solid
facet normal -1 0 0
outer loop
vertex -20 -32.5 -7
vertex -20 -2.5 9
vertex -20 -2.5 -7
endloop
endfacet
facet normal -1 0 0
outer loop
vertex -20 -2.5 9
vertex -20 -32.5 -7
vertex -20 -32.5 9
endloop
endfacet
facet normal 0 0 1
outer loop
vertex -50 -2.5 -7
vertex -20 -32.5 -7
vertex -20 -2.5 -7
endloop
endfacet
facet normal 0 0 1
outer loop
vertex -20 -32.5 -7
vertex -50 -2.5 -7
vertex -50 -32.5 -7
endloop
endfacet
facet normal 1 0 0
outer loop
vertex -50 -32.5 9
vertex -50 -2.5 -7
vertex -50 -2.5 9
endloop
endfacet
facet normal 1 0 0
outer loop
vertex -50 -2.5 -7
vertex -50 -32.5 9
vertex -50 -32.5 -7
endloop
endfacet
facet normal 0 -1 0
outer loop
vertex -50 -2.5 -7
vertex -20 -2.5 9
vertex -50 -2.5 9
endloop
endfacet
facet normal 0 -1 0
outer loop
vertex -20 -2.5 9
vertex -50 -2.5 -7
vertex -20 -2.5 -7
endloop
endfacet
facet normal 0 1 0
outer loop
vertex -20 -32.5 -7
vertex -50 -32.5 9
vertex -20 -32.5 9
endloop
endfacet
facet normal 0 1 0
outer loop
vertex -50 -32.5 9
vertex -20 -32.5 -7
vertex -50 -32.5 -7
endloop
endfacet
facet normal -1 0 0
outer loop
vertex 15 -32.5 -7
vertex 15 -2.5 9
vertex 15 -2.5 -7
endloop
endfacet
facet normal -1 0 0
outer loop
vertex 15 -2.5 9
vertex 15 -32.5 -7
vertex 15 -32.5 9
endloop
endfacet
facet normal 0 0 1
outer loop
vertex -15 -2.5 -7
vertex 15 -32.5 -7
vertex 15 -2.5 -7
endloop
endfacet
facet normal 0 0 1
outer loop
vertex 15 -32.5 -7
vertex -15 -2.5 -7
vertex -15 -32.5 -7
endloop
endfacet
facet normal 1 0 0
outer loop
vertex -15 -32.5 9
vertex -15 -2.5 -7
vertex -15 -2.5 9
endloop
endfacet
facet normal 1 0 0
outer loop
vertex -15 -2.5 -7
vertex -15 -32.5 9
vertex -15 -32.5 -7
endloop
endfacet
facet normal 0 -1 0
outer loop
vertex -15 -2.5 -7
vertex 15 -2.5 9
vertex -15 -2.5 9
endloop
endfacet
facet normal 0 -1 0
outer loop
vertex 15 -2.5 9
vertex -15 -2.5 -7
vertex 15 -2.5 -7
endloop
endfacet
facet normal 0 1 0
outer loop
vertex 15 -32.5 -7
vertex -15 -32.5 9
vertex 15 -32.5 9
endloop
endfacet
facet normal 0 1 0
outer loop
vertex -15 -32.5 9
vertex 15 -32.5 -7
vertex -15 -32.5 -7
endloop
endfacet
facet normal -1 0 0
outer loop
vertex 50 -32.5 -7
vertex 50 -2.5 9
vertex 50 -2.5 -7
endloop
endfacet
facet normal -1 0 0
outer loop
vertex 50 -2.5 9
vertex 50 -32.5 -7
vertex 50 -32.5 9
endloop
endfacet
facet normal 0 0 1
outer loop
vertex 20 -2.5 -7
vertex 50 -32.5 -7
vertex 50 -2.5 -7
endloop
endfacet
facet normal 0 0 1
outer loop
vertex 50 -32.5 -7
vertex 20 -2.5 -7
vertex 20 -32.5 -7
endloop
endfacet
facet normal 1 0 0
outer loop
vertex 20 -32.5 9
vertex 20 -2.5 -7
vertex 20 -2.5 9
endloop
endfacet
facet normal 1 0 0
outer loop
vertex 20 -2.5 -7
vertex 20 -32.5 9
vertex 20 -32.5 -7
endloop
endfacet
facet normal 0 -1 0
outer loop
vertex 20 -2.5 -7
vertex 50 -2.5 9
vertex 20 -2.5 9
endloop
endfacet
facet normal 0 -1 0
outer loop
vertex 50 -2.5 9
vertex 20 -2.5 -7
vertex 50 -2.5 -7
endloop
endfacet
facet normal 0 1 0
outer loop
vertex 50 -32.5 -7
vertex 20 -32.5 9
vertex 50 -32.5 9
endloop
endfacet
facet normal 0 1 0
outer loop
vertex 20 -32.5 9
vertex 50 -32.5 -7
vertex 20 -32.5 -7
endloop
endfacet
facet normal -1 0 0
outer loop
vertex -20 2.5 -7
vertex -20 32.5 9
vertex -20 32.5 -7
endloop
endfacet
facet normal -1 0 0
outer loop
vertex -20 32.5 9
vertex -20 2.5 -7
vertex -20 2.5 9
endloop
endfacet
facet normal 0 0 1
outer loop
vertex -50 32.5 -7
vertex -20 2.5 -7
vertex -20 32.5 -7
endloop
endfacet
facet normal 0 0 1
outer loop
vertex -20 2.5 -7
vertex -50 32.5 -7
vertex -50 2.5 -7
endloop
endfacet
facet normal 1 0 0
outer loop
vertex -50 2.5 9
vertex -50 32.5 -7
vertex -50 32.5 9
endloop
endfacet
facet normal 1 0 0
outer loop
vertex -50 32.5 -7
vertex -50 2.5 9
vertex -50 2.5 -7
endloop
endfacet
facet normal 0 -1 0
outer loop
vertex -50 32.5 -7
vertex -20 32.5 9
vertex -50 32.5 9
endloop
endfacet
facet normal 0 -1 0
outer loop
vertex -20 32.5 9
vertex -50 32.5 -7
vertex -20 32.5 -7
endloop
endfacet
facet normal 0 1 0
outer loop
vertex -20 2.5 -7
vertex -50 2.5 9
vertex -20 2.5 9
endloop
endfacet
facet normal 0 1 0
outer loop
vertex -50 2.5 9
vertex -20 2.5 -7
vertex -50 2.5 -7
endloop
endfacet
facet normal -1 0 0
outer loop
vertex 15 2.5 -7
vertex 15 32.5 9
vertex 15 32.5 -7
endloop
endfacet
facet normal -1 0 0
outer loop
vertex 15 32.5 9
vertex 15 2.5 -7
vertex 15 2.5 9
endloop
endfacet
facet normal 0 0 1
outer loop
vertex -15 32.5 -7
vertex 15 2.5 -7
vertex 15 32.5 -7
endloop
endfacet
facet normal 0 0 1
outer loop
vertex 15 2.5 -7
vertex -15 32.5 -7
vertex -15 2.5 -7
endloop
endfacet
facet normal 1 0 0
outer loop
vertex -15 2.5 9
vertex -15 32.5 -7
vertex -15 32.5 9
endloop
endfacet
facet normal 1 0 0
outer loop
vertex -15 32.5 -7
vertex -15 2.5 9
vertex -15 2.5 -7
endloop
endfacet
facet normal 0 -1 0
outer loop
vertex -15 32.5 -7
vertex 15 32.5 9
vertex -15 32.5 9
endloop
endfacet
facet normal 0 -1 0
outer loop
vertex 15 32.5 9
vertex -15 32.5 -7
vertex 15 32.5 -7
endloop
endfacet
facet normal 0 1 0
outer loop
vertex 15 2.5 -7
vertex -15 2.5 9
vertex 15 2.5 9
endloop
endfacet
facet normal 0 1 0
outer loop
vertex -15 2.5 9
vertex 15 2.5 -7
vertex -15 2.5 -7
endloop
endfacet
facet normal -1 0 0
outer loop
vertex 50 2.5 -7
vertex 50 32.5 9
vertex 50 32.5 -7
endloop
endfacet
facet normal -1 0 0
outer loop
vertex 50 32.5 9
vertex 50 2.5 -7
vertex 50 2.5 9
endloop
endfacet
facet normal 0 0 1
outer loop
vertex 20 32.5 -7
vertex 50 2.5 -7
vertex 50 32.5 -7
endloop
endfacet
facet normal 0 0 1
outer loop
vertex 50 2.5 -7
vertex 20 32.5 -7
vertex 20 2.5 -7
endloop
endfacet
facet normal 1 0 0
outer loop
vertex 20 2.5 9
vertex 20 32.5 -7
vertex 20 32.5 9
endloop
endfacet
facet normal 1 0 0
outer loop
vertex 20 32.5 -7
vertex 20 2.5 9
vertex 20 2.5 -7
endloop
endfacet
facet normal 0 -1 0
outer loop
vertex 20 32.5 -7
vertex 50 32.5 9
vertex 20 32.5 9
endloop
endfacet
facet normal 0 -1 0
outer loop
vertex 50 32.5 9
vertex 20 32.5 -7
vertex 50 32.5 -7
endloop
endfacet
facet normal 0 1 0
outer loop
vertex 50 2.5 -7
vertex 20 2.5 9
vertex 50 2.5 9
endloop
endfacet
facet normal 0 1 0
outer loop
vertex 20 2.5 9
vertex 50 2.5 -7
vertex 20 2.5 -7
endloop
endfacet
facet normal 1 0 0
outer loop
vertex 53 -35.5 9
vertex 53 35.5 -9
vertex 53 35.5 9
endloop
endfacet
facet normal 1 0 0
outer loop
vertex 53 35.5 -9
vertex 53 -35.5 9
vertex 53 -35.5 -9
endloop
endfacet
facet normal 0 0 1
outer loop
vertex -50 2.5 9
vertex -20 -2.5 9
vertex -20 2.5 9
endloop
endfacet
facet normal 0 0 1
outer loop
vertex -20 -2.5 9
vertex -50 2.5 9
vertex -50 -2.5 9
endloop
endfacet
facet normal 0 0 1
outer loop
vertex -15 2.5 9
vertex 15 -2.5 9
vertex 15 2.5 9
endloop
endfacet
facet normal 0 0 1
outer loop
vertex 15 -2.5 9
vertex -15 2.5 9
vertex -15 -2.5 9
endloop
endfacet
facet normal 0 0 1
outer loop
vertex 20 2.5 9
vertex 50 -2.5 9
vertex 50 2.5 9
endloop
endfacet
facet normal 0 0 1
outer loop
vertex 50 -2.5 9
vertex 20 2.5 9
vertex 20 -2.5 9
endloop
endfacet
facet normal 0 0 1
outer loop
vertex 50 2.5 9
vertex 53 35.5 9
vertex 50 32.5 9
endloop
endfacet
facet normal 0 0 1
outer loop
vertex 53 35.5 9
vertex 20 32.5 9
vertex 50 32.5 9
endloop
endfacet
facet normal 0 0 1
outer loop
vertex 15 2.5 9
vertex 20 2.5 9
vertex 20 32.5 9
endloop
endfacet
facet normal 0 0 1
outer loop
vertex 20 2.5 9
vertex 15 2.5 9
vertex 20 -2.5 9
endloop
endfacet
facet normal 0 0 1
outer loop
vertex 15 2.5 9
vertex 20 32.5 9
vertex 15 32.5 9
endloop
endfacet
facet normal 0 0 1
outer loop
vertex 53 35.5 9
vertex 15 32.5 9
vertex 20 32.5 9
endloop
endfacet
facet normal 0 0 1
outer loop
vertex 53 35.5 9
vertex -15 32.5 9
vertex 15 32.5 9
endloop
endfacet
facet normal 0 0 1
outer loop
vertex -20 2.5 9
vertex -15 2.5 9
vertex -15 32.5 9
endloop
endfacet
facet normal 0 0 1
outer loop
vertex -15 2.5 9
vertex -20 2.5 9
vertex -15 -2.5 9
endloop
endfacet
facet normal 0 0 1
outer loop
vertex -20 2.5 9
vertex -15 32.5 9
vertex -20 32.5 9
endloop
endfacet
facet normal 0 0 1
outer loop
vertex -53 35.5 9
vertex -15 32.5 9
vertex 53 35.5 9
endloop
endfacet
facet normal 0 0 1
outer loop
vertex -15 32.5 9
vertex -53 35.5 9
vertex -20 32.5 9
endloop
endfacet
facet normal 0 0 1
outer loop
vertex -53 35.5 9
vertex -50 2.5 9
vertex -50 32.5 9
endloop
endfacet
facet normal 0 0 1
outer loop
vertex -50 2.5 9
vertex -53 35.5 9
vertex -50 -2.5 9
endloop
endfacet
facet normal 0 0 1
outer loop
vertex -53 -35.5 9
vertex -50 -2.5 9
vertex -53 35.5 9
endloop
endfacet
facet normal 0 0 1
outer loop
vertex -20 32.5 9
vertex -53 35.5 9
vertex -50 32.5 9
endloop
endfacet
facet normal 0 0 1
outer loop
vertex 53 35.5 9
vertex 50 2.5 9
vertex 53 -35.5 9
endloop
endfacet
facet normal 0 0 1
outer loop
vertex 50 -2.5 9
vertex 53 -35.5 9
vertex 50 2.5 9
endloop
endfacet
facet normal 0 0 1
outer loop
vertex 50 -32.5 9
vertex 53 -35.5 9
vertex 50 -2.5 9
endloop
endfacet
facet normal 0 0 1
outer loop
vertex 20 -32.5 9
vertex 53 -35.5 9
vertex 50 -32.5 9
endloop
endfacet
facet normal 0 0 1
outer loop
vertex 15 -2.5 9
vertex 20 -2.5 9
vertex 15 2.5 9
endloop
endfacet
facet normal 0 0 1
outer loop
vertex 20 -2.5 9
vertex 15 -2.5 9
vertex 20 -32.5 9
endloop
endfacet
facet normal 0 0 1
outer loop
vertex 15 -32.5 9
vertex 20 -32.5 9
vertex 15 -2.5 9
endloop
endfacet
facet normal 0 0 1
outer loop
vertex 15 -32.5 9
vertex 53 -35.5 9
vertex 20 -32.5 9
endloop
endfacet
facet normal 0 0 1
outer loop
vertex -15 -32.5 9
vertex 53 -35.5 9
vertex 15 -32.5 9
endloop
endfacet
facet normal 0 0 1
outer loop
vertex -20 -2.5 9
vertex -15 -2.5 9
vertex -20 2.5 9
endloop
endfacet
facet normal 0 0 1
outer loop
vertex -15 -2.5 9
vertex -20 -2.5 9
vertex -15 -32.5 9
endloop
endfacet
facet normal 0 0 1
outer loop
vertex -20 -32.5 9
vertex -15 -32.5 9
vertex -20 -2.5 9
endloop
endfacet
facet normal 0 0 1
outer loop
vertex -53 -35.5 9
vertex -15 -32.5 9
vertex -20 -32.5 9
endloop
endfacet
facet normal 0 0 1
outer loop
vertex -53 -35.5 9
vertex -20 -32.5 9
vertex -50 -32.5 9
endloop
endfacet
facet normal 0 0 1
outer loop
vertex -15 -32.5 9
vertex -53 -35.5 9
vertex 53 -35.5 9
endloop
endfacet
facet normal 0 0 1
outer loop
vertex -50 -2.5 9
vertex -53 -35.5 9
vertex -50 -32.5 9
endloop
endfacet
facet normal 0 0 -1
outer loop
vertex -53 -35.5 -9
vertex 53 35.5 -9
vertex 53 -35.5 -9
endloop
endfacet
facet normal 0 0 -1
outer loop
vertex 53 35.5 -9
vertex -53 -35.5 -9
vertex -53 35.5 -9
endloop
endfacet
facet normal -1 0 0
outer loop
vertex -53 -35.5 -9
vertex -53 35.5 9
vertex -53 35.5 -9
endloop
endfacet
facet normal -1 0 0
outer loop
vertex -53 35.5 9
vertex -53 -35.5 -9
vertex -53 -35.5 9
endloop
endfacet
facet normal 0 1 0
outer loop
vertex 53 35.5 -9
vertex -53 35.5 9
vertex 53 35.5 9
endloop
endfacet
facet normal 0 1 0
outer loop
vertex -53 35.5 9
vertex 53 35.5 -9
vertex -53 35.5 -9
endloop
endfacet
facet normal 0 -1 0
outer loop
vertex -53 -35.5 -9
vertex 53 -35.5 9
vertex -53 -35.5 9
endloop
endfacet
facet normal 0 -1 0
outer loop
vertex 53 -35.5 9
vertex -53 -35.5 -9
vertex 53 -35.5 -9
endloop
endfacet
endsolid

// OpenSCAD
$fn = 32;

// ----------------------------------------------------------------------
// Pocket plate 106 x 71 x 18
// 2 x 3 pockets 30 mm square, 16 mm deep
// ----------------------------------------------------------------------

// --- parameters (mm) ---
thickness = 18;  // plate thickness
floor_t = 2;     // material left under each pocket
pocket = 30;     // pocket side length
pitch_x = 35;    // pocket pitch along X
pitch_y = 35;    // pocket pitch along Y
cols = 3;        // pockets per row
rows = 2;        // rows of pockets

// --- derived feature positions (mm) ---
depth = thickness - floor_t;        // = 16   pocket depth, down to the floor
span_x = (cols - 1) * pitch_x;      // = 70   distance between outer pockets
span_y = (rows - 1) * pitch_y;      // = 35   distance between outer pocket rows
origin_x = -span_x / 2;             // = -35   X of the first pocket
origin_y = -span_y / 2;             // = -17.5   Y of the first pocket
plate = [span_x + pocket + 6, span_y + pocket + 6, thickness];  // = [106, 71, 18]   overall size: pockets plus 3 mm of wall on each side
feature_centers = [
  [origin_x + 0 * pitch_x, origin_y + 0 * pitch_y],
  [origin_x + 1 * pitch_x, origin_y + 0 * pitch_y],
  [origin_x + 2 * pitch_x, origin_y + 0 * pitch_y],
  [origin_x + 0 * pitch_x, origin_y + 1 * pitch_y],
  [origin_x + 1 * pitch_x, origin_y + 1 * pitch_y],
  [origin_x + 2 * pitch_x, origin_y + 1 * pitch_y]
];   // pocket centres, used verbatim by the cutter loop

// plate outline, then one pocket per centre in feature_centers
difference() {
  cube(plate, center = true);
  for (centre = feature_centers)
    translate([centre[0] - pocket / 2, centre[1] - pocket / 2, plate[2] / 2 - depth])
      cube([pocket, pocket, depth + 1]);  // centred on the declared pocket centre
}
